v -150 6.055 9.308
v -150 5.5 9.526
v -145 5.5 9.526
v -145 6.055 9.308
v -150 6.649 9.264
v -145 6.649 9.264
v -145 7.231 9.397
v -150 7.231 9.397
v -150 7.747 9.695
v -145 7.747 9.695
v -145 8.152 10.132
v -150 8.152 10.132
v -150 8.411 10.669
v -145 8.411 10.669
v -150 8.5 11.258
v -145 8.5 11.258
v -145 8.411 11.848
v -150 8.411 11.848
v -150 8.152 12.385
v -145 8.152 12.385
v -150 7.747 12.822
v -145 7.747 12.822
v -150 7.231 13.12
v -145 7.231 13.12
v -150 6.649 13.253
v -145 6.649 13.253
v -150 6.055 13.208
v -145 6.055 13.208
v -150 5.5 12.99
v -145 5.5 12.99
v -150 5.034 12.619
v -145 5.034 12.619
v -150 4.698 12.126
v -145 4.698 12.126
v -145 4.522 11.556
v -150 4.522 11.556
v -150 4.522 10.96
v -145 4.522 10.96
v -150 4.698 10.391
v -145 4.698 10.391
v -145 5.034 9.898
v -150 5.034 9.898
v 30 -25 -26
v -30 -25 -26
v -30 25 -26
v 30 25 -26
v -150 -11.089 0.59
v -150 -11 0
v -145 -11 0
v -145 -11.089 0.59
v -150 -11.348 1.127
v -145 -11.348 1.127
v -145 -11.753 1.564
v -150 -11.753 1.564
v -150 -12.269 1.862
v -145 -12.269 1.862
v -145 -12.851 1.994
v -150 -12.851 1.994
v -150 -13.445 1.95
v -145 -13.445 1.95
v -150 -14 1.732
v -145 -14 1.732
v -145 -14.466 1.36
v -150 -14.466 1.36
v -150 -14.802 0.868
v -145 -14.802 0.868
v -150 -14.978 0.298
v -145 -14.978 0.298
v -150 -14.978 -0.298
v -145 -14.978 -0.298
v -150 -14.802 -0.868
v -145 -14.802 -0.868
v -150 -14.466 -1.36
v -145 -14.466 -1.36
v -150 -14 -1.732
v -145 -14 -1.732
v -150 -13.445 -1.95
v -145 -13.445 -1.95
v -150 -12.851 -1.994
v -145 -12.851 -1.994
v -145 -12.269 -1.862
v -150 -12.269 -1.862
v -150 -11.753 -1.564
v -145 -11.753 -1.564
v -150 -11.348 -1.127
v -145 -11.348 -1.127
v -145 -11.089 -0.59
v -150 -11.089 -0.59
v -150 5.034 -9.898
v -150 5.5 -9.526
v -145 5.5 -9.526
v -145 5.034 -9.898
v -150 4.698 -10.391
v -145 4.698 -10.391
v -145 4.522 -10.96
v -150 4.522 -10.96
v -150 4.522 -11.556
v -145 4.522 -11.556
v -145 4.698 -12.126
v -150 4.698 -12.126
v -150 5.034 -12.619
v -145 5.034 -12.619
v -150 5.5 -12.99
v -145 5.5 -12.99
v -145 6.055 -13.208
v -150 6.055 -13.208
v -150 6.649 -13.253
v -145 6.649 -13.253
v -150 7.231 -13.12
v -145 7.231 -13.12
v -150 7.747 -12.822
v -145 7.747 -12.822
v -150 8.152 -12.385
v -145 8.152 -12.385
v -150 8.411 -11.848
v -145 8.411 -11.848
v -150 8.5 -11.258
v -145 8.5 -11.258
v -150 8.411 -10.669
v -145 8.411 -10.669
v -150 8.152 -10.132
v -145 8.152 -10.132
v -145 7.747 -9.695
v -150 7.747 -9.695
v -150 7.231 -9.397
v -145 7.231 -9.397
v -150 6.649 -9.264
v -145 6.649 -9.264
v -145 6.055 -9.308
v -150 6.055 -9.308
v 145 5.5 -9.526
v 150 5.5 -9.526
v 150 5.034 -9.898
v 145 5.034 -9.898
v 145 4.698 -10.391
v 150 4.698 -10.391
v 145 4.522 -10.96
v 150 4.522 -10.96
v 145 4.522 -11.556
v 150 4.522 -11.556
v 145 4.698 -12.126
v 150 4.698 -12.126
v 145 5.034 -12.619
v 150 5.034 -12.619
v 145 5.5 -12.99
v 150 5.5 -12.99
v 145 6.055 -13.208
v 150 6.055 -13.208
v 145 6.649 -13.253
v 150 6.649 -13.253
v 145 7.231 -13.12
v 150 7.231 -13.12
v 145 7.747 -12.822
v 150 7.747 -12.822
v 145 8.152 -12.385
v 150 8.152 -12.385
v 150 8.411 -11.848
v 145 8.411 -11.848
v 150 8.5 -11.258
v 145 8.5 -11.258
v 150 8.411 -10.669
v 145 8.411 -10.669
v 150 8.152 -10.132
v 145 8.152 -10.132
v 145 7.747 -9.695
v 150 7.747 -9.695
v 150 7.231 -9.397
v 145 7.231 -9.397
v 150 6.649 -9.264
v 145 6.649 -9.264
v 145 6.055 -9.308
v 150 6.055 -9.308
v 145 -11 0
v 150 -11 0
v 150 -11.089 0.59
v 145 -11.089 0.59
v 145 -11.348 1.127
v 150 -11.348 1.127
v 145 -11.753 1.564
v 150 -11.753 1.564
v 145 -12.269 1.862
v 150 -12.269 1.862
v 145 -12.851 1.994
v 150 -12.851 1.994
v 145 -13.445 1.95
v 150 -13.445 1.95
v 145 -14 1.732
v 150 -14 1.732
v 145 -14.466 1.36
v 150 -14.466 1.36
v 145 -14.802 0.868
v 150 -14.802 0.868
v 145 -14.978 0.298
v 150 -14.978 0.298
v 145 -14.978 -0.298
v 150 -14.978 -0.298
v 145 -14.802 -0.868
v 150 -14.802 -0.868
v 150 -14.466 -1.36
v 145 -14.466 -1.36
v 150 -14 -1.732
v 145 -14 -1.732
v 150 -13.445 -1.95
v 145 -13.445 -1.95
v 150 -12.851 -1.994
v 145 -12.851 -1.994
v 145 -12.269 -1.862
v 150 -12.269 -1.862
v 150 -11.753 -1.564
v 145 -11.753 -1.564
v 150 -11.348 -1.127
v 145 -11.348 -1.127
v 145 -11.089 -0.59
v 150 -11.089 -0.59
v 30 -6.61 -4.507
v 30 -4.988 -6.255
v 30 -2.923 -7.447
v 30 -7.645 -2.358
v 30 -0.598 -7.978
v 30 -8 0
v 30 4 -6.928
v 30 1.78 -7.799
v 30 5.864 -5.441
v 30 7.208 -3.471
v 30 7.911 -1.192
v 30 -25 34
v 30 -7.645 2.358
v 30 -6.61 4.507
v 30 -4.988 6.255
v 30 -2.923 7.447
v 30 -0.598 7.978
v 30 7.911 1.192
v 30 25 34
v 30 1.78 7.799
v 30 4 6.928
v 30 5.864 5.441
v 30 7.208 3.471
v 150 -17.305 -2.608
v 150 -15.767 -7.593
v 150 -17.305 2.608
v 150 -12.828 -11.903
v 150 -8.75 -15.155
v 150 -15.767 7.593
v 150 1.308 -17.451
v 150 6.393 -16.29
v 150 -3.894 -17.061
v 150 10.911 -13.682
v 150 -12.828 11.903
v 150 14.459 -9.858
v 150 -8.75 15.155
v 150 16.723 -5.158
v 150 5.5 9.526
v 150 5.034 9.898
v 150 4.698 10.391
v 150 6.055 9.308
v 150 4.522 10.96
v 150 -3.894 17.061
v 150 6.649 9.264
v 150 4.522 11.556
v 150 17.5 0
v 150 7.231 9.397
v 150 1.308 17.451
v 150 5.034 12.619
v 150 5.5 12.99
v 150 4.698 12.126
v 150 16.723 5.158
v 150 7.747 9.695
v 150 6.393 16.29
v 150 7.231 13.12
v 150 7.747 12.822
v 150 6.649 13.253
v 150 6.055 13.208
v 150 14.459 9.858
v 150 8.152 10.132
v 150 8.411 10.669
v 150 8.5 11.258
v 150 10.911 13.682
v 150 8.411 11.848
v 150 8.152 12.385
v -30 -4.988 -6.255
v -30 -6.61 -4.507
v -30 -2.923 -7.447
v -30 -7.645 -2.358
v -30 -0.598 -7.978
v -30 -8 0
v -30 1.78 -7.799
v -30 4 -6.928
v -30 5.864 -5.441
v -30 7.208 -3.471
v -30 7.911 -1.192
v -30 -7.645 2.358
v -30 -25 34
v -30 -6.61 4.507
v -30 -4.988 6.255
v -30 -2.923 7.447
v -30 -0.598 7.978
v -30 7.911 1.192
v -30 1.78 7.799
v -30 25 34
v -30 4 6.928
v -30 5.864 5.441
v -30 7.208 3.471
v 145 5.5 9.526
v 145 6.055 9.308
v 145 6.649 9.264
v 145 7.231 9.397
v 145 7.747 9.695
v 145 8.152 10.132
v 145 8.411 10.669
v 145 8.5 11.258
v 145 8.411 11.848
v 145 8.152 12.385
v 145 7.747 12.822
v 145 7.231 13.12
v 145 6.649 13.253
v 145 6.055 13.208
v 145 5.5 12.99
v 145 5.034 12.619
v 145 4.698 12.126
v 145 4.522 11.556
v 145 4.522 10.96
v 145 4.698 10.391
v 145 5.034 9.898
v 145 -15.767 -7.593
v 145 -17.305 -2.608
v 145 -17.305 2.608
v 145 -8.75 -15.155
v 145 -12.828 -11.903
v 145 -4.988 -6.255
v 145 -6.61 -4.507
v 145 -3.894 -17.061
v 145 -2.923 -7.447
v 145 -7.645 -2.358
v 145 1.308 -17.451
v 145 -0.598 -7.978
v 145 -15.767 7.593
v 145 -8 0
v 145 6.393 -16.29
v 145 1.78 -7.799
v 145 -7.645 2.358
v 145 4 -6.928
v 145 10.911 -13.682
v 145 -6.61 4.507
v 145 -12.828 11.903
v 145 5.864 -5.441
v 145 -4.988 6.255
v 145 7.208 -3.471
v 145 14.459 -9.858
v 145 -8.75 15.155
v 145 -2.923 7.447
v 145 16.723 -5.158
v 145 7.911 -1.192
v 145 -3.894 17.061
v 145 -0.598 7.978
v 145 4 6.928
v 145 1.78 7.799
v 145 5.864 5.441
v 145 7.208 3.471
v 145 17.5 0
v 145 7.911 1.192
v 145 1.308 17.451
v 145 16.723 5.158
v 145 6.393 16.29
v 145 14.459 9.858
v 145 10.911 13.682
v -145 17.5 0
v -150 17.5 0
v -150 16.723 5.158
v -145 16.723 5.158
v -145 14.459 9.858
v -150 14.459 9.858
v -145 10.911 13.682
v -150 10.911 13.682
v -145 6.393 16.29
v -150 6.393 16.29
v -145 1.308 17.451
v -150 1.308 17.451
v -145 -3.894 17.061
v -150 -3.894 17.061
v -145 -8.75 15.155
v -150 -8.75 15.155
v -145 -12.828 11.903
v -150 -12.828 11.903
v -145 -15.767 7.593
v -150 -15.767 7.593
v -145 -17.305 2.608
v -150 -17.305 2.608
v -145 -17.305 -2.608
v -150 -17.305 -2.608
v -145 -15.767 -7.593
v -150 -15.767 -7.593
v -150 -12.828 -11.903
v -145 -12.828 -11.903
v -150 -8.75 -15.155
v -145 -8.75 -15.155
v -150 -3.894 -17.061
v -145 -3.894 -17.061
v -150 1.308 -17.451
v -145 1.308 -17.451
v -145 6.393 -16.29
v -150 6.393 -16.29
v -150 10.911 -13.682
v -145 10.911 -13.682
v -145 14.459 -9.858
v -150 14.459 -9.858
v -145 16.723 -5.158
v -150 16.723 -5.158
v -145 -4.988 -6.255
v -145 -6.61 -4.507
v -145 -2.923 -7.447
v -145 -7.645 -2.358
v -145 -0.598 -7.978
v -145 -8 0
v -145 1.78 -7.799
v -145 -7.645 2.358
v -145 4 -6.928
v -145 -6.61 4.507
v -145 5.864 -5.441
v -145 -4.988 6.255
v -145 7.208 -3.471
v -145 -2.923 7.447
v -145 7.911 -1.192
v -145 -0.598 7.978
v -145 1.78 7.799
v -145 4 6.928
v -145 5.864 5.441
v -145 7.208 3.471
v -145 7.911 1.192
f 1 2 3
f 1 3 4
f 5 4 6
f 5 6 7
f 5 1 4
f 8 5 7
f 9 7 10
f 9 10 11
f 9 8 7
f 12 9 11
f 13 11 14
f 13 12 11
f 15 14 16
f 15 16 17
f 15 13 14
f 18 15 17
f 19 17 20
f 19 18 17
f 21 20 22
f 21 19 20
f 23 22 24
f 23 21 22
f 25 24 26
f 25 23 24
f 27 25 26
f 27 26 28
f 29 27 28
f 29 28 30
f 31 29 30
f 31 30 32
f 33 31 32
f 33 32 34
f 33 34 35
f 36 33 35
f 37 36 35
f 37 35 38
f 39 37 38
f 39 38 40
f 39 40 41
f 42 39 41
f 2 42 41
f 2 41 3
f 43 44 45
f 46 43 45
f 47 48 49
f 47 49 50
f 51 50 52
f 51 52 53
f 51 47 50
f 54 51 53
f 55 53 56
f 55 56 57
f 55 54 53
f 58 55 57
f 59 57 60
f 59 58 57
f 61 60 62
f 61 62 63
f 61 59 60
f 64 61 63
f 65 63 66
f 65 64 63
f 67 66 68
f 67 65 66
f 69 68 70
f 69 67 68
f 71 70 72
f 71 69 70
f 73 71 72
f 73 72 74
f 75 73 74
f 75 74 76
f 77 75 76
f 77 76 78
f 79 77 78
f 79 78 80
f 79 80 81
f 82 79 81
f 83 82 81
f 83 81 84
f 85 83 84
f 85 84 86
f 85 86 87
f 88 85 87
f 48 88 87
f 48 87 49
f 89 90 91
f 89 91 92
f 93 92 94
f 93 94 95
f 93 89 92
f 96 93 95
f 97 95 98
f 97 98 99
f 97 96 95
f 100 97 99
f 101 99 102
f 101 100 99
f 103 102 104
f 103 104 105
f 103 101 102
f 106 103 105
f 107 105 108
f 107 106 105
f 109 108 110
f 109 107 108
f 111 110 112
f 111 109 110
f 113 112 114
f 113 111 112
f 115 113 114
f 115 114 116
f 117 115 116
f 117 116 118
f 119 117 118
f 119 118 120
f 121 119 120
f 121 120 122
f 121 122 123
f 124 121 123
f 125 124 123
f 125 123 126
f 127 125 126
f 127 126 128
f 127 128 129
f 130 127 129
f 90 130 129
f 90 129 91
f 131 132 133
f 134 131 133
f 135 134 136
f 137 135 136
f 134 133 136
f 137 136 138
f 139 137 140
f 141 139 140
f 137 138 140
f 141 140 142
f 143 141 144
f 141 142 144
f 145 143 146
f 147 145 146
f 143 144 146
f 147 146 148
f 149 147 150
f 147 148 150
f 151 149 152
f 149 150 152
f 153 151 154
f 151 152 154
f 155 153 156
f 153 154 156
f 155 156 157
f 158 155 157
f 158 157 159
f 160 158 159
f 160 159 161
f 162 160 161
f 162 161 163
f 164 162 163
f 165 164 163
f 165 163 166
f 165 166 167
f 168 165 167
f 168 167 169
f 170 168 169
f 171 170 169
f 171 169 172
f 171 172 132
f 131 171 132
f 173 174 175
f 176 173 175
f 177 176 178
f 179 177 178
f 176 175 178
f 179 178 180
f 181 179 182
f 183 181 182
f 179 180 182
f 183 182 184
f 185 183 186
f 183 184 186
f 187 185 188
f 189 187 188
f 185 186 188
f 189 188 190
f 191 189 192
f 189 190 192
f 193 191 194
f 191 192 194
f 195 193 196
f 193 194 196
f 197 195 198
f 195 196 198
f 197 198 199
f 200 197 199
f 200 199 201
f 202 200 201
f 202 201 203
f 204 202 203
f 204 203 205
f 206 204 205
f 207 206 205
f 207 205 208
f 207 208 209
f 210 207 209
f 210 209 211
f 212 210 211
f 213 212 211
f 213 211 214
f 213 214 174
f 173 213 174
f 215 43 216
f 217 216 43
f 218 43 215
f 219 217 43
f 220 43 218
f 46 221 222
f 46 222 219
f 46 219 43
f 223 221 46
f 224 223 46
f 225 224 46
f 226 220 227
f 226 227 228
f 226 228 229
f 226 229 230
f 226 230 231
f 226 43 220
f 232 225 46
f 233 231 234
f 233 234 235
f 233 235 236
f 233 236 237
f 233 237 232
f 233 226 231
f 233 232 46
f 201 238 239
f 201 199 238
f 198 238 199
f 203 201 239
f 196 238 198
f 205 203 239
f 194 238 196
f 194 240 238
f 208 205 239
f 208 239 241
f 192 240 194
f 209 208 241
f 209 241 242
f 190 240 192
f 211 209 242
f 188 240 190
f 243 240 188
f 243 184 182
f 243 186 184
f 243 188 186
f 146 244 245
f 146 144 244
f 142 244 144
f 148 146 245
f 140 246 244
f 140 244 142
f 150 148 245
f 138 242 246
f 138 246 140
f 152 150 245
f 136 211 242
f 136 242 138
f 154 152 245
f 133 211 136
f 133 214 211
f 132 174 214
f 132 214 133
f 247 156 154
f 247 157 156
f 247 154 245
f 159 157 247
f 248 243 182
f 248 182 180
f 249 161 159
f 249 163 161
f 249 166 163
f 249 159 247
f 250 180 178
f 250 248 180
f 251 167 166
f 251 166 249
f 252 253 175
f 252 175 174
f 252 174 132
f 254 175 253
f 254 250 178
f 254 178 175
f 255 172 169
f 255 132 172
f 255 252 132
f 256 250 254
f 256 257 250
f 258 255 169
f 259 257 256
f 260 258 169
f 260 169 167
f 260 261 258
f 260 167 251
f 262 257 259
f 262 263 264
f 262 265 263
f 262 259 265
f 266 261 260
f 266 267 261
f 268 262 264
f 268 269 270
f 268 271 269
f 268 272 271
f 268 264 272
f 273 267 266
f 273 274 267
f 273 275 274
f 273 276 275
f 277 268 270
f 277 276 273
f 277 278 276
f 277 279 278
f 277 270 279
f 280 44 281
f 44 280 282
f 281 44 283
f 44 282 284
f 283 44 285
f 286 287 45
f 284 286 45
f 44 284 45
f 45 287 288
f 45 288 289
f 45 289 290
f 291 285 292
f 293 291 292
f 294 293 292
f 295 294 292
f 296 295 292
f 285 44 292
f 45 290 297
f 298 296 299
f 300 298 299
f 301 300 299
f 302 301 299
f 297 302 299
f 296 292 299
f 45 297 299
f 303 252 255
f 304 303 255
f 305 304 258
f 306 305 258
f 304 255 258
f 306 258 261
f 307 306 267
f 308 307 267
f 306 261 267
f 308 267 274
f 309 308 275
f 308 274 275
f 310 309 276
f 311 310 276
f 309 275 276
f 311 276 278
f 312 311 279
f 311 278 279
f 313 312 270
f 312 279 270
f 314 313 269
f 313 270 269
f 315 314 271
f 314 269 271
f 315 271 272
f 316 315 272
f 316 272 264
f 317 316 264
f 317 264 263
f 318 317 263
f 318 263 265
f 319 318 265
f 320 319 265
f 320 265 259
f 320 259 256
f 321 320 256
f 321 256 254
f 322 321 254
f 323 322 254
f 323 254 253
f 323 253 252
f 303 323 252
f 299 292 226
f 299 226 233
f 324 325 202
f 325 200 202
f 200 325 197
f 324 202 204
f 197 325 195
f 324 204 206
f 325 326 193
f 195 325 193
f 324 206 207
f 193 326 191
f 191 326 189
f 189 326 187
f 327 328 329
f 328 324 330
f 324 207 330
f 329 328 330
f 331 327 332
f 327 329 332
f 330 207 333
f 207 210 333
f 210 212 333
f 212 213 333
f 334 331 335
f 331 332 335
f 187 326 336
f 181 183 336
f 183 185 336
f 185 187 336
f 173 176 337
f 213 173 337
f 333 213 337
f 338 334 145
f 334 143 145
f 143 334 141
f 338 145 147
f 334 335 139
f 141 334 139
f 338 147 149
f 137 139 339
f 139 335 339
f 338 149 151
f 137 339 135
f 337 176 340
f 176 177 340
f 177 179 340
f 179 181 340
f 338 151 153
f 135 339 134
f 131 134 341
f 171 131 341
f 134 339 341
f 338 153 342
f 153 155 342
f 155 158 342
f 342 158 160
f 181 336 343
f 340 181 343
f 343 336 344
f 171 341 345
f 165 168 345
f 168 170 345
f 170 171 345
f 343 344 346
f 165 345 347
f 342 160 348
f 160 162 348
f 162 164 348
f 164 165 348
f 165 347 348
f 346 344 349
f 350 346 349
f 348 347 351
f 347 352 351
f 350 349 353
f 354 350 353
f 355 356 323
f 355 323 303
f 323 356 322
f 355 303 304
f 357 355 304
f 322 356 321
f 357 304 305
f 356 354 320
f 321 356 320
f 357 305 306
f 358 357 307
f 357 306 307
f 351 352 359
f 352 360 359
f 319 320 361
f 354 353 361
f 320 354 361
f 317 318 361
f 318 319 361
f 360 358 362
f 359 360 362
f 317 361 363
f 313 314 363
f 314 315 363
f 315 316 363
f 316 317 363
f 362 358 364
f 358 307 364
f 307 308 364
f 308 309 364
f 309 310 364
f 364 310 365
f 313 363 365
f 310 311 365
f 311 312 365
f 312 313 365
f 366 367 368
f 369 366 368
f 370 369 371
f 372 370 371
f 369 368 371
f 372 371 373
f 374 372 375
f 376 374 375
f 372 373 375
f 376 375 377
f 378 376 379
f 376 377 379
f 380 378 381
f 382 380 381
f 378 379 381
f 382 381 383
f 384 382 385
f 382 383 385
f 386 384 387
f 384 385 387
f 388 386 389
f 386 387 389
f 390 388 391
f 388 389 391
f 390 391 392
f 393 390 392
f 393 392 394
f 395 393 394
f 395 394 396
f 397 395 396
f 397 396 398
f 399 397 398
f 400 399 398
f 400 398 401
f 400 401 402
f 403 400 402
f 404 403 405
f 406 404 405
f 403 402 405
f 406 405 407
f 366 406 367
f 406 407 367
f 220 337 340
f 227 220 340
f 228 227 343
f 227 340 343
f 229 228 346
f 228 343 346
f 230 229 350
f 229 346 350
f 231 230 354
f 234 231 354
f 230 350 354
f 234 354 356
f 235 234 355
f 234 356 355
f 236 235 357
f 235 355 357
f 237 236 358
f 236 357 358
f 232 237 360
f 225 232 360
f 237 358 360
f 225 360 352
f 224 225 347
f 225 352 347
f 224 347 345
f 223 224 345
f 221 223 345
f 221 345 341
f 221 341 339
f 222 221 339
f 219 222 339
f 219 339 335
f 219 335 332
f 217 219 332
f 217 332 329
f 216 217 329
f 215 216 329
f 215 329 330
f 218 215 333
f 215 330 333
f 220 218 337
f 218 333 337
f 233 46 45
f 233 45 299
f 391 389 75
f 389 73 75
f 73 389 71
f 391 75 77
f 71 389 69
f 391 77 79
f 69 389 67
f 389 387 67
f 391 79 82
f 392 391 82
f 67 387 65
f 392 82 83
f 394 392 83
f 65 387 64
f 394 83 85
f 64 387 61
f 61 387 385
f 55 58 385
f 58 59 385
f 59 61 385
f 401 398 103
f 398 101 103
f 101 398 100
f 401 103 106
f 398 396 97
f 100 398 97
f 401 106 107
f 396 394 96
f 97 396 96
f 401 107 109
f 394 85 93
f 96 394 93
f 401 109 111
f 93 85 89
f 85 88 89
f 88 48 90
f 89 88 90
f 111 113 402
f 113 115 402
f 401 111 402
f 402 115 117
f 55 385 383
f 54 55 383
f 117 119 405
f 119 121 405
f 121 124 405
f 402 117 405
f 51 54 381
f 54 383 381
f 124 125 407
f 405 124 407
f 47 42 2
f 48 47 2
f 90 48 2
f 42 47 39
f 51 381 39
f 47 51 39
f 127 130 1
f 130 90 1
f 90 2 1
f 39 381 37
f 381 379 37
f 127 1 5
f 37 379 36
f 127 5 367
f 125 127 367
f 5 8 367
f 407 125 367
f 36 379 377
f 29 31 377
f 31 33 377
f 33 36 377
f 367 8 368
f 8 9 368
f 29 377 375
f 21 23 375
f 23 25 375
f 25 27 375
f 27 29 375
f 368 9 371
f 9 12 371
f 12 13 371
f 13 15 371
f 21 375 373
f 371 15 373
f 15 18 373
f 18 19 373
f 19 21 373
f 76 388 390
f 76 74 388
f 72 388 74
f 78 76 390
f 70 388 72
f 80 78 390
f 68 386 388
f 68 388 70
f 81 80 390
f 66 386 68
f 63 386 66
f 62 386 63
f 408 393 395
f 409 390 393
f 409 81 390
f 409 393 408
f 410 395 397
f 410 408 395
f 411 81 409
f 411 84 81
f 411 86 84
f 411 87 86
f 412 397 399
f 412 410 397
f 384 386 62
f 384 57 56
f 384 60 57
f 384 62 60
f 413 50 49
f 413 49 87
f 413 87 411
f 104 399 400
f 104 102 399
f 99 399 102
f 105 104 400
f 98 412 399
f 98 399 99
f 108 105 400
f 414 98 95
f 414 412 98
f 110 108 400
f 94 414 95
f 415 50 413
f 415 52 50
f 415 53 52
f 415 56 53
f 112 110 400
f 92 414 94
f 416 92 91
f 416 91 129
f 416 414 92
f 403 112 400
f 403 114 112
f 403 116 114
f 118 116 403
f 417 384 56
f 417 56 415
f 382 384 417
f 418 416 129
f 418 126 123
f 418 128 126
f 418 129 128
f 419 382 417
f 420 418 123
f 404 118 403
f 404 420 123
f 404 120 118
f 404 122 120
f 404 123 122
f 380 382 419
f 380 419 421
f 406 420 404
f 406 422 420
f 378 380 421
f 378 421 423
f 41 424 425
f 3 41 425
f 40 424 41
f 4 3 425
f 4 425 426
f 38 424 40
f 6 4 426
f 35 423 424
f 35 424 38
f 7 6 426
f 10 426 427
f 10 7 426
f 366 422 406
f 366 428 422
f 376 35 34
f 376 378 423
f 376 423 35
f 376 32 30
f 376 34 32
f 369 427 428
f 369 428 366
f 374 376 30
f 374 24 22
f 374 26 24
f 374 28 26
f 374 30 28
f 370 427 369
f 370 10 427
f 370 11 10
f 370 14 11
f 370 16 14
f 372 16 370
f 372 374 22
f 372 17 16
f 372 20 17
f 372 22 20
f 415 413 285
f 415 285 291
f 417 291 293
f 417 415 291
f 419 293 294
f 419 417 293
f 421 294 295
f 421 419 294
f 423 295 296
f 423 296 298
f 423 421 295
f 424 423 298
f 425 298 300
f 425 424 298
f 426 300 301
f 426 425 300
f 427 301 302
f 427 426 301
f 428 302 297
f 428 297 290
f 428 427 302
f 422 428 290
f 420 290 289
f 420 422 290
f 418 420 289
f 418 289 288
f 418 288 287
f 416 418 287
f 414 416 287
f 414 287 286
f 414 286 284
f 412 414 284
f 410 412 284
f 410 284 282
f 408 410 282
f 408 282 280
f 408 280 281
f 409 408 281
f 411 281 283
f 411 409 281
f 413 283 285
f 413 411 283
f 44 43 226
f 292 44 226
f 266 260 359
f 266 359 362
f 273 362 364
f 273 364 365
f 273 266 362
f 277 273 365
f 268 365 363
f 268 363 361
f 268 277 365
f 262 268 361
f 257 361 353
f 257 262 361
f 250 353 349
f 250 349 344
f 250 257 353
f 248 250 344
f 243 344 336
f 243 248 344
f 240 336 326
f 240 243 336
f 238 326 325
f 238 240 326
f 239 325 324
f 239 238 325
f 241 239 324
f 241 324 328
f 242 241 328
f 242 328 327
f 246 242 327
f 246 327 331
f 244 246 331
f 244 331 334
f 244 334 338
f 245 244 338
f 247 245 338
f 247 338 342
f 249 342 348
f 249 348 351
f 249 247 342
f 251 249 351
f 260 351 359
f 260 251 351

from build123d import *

# Parameters (mm, degrees)
F1_R            = 17.5
F2_DEPTH        = 5
F3_W            = 50
F3_H            = 60
F4_DEPTH        = 30
F5_R            = 8
F6_DEPTH        = 115
F7_R            = 2
F8_DEPTH        = 25
F8_COPIES_COUNT = 3


# Not quite as in the source:
# - a pattern or mirror of a feature is missing from the dataset's text; its kind, count and spacing are read off the source's solid


with BuildPart() as f2:
    # F1 (on offset) → F2 (new body)
    with BuildSketch(Plane.YZ.offset(150)):
        Circle(F1_R)
    extrude(amount=-F2_DEPTH)



with BuildPart() as f4:
    # F3 (on Right) → F4 (new body)
    with BuildSketch(Plane.YZ):
        with Locations((0, 4)):
            Rectangle(F3_W, F3_H)
    extrude(amount=F4_DEPTH)


with BuildPart() as f2_1:
    add(f2.part)

    add(f4.part)  # F6 merges F4
    # F5 (on face) → F6 (join, through all)
    with BuildSketch(Plane(origin=(145, 0, 0), x_dir=(0, -1, 0), z_dir=(-1, 0, 0))):
        Circle(F5_R)
    extrude(amount=F6_DEPTH)

    # F7 (on face) → F8 (cut)
    with BuildSketch(Plane.YZ.offset(150)):
        with Locations((-13, 0)):
            Circle(F7_R)
    f8 = extrude(amount=-F8_DEPTH, mode=Mode.SUBTRACT)

    # F8_copies: F8 ×3 about axis
    f8_copies_axis = Axis((0, 0, 0), (1, 0, 0))
    for i in range(1, F8_COPIES_COUNT):
        add(f8.rotate(f8_copies_axis, i * 360 / F8_COPIES_COUNT), mode=Mode.SUBTRACT)

    # F9: F2 across plane


with BuildPart() as f2_2:
    add(f2_1.part)
    add(f2_1.part.mirror(Plane.YZ))

    # F10: F2 across plane


with BuildPart() as f2_3:
    add(f2_2.part)
    add(f2_2.part.mirror(Plane.YZ))

    # F11: F2 across plane


with BuildPart() as f2_4:
    add(f2_3.part)
    add(f2_3.part.mirror(Plane.YZ))


solid = f2_4.part
